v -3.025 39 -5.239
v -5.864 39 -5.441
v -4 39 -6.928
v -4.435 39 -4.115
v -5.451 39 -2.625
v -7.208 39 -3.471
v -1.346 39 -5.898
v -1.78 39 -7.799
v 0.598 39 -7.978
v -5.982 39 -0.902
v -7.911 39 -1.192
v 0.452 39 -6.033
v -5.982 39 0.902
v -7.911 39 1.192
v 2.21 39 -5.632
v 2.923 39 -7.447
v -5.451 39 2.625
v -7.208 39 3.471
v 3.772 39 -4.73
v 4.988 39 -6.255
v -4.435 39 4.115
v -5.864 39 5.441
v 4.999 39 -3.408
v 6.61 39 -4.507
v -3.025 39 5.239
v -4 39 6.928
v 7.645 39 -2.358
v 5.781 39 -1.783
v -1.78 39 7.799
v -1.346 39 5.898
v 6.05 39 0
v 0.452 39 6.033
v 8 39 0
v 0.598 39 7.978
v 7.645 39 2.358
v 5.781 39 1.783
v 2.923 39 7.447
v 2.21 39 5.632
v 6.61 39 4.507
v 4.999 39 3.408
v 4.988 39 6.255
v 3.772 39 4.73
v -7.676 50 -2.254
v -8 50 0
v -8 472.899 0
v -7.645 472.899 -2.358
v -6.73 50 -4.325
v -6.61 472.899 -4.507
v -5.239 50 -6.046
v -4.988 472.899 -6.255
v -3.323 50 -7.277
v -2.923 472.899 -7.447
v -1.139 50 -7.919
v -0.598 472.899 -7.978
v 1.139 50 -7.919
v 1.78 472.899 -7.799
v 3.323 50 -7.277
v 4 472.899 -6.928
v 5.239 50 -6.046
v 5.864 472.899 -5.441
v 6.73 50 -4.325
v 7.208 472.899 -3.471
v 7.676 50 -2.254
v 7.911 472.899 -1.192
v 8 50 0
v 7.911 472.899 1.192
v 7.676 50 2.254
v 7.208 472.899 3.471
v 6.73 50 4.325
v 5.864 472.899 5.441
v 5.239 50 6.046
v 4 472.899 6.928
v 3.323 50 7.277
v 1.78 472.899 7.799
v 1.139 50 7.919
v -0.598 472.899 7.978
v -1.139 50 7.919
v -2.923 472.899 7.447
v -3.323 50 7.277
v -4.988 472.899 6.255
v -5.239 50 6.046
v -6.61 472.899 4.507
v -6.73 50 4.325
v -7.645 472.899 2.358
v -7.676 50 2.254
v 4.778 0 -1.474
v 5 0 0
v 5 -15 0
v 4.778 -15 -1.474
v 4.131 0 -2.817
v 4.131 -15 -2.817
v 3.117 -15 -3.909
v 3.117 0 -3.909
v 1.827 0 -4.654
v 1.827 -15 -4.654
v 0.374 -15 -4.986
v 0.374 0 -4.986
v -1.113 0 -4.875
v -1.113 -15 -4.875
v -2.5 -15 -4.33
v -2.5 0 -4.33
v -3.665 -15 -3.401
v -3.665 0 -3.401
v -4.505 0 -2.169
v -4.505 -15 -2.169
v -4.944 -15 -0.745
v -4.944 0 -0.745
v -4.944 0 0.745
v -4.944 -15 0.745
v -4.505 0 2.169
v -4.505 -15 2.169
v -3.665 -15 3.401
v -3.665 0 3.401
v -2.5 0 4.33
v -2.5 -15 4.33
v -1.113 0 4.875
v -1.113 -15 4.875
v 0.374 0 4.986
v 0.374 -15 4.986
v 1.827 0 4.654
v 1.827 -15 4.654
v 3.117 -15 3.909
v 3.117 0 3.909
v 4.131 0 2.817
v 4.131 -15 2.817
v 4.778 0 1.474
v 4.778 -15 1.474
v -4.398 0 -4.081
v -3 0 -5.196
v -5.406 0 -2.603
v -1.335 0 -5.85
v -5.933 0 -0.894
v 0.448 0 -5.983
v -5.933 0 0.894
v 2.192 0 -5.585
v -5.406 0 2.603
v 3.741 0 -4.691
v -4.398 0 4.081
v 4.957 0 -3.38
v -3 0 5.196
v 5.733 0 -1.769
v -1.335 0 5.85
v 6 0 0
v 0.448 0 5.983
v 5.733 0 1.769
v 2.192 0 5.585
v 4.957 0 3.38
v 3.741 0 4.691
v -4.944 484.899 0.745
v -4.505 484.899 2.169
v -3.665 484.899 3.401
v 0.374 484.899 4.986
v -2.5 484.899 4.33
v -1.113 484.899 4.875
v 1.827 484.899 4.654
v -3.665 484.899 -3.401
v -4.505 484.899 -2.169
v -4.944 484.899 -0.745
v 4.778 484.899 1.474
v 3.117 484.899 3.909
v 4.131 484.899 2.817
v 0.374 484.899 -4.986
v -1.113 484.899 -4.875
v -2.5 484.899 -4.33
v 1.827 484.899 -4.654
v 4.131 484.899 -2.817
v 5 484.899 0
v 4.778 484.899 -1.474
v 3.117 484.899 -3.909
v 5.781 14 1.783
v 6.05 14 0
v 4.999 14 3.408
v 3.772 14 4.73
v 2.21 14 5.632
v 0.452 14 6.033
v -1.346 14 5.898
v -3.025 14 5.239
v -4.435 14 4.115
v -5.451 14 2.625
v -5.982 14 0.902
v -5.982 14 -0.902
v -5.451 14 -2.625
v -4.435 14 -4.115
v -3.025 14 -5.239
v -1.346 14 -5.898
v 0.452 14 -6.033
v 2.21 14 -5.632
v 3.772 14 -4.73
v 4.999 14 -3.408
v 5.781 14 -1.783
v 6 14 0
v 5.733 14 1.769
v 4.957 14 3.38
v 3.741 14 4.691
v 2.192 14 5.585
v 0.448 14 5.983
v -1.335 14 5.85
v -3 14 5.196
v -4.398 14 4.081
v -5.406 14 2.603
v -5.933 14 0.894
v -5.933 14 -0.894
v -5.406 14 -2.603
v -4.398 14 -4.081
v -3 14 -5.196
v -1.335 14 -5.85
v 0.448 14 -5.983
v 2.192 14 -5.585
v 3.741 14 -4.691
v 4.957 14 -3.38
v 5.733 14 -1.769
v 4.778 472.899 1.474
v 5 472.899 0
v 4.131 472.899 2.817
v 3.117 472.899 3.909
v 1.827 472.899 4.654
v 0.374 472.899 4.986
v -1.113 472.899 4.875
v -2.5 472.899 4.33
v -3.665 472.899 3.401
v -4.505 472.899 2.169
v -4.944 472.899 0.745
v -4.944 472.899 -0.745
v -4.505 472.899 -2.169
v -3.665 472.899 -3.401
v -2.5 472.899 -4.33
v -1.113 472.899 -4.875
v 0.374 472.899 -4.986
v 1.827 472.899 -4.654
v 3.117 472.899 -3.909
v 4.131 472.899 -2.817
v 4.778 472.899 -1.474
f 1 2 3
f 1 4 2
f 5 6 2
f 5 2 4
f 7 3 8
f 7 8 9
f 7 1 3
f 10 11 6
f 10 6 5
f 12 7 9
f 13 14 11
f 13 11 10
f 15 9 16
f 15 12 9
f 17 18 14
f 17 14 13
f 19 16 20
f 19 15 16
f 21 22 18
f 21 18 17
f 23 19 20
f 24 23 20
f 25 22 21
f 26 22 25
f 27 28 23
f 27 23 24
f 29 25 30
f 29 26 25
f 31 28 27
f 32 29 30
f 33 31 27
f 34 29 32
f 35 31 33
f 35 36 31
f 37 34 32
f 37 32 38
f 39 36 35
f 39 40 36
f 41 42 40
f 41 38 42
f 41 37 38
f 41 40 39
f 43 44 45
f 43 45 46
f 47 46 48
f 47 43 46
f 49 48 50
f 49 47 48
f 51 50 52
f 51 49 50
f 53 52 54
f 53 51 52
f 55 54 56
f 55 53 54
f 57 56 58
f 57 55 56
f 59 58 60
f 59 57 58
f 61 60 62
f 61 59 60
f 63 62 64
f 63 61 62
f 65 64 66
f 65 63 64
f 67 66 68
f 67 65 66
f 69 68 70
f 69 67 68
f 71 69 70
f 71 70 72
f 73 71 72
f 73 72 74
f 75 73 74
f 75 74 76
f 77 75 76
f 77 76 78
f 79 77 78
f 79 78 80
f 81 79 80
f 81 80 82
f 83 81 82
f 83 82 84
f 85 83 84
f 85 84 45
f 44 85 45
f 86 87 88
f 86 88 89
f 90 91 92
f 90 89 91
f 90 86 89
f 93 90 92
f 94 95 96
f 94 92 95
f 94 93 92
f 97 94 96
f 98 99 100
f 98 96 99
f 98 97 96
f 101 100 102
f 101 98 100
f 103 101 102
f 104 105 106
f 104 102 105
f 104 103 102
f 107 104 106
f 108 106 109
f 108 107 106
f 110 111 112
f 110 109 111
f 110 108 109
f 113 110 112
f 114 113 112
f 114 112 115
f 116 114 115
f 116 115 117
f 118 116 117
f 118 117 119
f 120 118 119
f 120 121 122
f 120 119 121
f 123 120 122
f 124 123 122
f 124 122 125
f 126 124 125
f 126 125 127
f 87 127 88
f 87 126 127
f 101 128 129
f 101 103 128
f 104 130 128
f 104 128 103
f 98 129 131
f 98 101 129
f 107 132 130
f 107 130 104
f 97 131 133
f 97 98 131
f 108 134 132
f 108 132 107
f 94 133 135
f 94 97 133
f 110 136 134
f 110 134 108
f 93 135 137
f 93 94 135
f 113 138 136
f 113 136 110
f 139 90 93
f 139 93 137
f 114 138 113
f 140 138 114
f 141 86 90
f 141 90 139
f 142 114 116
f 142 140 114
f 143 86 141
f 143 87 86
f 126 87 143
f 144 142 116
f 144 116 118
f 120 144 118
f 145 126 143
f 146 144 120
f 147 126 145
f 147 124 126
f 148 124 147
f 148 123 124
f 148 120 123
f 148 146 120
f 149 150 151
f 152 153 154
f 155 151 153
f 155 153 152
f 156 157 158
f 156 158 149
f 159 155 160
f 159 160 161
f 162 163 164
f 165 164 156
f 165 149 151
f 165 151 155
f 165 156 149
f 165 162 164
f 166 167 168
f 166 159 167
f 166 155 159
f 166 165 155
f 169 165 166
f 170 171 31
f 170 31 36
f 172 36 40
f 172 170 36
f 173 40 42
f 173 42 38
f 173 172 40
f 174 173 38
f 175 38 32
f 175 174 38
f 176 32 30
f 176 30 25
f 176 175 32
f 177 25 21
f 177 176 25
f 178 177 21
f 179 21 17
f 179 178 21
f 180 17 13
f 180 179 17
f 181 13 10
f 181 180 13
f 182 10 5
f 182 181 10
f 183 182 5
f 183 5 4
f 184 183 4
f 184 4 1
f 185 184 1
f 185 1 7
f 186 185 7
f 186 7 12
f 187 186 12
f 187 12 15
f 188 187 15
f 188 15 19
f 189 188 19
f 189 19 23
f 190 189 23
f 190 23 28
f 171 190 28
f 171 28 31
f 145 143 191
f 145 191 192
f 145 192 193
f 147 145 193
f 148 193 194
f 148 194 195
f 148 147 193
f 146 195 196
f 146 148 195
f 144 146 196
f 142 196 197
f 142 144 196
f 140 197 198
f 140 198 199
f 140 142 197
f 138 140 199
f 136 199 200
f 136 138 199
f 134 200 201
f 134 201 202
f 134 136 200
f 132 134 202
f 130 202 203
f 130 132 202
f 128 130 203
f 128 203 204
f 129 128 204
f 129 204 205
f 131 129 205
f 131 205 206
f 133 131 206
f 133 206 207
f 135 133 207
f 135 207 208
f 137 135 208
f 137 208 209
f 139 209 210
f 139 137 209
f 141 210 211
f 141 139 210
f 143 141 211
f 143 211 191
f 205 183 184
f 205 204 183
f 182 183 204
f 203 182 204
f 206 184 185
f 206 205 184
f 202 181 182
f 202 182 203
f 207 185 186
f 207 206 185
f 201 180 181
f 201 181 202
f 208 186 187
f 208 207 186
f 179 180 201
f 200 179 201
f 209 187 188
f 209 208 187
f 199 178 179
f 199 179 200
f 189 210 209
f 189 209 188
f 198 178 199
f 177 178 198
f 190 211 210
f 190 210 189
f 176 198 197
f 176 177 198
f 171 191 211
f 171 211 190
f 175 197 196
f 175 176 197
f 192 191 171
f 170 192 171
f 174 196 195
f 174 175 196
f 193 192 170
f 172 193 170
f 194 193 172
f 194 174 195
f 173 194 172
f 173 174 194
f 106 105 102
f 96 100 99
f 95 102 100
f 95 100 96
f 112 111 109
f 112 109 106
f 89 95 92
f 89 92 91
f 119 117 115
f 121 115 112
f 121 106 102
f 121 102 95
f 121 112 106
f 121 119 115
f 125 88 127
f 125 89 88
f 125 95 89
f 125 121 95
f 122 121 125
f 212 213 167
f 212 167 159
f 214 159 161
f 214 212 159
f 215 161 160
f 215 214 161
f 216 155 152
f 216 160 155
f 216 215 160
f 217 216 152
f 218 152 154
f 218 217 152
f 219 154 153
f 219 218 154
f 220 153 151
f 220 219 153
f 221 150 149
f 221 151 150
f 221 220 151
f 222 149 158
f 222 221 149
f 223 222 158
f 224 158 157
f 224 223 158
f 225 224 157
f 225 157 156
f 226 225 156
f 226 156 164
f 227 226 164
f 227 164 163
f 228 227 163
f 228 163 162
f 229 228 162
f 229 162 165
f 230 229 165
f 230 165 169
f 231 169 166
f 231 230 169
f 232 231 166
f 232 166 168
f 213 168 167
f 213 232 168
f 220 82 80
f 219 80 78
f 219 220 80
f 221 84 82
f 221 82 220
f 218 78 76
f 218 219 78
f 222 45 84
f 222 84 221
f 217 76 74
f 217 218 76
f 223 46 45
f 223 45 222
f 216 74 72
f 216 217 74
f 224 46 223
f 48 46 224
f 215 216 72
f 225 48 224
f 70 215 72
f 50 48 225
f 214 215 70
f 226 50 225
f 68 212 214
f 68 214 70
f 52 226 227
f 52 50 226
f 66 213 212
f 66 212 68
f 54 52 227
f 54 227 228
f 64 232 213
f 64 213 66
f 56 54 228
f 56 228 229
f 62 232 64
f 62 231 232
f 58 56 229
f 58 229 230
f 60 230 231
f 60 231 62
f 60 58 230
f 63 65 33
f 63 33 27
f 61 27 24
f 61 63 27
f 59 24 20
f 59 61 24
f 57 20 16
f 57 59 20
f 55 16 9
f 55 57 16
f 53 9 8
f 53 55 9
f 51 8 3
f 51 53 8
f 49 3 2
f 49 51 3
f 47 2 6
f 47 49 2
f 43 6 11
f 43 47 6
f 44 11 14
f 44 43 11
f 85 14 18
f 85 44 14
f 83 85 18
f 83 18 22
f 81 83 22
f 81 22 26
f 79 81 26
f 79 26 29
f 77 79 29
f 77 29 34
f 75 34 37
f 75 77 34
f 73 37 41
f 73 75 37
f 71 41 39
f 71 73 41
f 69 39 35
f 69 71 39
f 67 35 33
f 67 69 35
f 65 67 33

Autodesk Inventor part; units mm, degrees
ref_plane "YZ Plane" through (0, 0, 0) normal (1, 0, 0) x (0, 1, 0)
ref_plane "XZ Plane" through (0, 0, 0) normal (0, 1, 0) x (-1, 0, 0)
ref_plane "XY Plane" through (0, 0, 0) normal (0, 0, 1) x (1, 0, 0)
sketch "Sketch1" plane through (0, 0, 0) normal (0, 1, 0) x (-1, 0, 0)
  circle A0 centre (0, 0) radius 8
  dimension "d0" = 16
extrude "Extrusion1" add sketch "Sketch1" along normal blind 500
sketch "Sketch2" plane through (0, 0, 0) normal (0, -1, 0) x (1, 0, 0)
  circle A0 centre (0, 0) radius 8 projected
extrude "Extrusion2" cut sketch "Sketch2" against normal blind 50
sketch "Sketch3" plane through (0, 50, 0) normal (0, -1, 0) x (1, 0, 0)
  circle A0 centre (0, 0) radius 8 projected
extrude "Extrusion3" add sketch "Sketch3" along normal blind 50
sketch "Sketch4" plane through (0, 0, 0) normal (0, -1, 0) x (1, 0, 0)
  circle A0 centre (0, 0) radius 8 projected
  circle A1 centre (0, 0) radius 6
  dimension "d7" = 12
extrude "Extrusion4" cut sketch "Sketch4" against normal blind 14
thread "Thread1" size "M12x1" class "6g" standard "ANSI Metric M Profile" full length
sketch "Sketch6" plane through (0, 14, 0) normal (0, -1, 0) x (1, 0, 0)
  circle A0 centre (0, 0) radius 8 projected
  circle A1 centre (0, 0) radius 6.05
  dimension "d13" = 12.1
extrude "Extrusion5" cut sketch "Sketch6" against normal blind 25
sketch "Sketch7" plane through (0, 0, 0) normal (0, -1, 0) x (1, 0, 0)
  circle A0 centre (0, 0) radius 6 projected
  circle A1 centre (0, 0) radius 5
  dimension "d16" = 10
extrude "Extrusion6" add sketch "Sketch7" along normal blind 15 contours A1
sketch "Sketch8" plane through (0, 500, 0) normal (0, 1, 0) x (1, 0, 0)
  circle A0 centre (0, 0) radius 8 projected
extrude "Extrusion7" cut sketch "Sketch8" against normal blind 27.101
sketch "Sketch9" plane through (0, 472.899, 0) normal (0, 1, 0) x (1, 0, 0)
  circle A0 centre (0, 0) radius 8 projected
  circle A1 centre (0, 0) radius 5
  dimension "d21" = 10
extrude "Extrusion8" add sketch "Sketch9" along normal blind 12 contours A1
properties part number "1605_500mm"
